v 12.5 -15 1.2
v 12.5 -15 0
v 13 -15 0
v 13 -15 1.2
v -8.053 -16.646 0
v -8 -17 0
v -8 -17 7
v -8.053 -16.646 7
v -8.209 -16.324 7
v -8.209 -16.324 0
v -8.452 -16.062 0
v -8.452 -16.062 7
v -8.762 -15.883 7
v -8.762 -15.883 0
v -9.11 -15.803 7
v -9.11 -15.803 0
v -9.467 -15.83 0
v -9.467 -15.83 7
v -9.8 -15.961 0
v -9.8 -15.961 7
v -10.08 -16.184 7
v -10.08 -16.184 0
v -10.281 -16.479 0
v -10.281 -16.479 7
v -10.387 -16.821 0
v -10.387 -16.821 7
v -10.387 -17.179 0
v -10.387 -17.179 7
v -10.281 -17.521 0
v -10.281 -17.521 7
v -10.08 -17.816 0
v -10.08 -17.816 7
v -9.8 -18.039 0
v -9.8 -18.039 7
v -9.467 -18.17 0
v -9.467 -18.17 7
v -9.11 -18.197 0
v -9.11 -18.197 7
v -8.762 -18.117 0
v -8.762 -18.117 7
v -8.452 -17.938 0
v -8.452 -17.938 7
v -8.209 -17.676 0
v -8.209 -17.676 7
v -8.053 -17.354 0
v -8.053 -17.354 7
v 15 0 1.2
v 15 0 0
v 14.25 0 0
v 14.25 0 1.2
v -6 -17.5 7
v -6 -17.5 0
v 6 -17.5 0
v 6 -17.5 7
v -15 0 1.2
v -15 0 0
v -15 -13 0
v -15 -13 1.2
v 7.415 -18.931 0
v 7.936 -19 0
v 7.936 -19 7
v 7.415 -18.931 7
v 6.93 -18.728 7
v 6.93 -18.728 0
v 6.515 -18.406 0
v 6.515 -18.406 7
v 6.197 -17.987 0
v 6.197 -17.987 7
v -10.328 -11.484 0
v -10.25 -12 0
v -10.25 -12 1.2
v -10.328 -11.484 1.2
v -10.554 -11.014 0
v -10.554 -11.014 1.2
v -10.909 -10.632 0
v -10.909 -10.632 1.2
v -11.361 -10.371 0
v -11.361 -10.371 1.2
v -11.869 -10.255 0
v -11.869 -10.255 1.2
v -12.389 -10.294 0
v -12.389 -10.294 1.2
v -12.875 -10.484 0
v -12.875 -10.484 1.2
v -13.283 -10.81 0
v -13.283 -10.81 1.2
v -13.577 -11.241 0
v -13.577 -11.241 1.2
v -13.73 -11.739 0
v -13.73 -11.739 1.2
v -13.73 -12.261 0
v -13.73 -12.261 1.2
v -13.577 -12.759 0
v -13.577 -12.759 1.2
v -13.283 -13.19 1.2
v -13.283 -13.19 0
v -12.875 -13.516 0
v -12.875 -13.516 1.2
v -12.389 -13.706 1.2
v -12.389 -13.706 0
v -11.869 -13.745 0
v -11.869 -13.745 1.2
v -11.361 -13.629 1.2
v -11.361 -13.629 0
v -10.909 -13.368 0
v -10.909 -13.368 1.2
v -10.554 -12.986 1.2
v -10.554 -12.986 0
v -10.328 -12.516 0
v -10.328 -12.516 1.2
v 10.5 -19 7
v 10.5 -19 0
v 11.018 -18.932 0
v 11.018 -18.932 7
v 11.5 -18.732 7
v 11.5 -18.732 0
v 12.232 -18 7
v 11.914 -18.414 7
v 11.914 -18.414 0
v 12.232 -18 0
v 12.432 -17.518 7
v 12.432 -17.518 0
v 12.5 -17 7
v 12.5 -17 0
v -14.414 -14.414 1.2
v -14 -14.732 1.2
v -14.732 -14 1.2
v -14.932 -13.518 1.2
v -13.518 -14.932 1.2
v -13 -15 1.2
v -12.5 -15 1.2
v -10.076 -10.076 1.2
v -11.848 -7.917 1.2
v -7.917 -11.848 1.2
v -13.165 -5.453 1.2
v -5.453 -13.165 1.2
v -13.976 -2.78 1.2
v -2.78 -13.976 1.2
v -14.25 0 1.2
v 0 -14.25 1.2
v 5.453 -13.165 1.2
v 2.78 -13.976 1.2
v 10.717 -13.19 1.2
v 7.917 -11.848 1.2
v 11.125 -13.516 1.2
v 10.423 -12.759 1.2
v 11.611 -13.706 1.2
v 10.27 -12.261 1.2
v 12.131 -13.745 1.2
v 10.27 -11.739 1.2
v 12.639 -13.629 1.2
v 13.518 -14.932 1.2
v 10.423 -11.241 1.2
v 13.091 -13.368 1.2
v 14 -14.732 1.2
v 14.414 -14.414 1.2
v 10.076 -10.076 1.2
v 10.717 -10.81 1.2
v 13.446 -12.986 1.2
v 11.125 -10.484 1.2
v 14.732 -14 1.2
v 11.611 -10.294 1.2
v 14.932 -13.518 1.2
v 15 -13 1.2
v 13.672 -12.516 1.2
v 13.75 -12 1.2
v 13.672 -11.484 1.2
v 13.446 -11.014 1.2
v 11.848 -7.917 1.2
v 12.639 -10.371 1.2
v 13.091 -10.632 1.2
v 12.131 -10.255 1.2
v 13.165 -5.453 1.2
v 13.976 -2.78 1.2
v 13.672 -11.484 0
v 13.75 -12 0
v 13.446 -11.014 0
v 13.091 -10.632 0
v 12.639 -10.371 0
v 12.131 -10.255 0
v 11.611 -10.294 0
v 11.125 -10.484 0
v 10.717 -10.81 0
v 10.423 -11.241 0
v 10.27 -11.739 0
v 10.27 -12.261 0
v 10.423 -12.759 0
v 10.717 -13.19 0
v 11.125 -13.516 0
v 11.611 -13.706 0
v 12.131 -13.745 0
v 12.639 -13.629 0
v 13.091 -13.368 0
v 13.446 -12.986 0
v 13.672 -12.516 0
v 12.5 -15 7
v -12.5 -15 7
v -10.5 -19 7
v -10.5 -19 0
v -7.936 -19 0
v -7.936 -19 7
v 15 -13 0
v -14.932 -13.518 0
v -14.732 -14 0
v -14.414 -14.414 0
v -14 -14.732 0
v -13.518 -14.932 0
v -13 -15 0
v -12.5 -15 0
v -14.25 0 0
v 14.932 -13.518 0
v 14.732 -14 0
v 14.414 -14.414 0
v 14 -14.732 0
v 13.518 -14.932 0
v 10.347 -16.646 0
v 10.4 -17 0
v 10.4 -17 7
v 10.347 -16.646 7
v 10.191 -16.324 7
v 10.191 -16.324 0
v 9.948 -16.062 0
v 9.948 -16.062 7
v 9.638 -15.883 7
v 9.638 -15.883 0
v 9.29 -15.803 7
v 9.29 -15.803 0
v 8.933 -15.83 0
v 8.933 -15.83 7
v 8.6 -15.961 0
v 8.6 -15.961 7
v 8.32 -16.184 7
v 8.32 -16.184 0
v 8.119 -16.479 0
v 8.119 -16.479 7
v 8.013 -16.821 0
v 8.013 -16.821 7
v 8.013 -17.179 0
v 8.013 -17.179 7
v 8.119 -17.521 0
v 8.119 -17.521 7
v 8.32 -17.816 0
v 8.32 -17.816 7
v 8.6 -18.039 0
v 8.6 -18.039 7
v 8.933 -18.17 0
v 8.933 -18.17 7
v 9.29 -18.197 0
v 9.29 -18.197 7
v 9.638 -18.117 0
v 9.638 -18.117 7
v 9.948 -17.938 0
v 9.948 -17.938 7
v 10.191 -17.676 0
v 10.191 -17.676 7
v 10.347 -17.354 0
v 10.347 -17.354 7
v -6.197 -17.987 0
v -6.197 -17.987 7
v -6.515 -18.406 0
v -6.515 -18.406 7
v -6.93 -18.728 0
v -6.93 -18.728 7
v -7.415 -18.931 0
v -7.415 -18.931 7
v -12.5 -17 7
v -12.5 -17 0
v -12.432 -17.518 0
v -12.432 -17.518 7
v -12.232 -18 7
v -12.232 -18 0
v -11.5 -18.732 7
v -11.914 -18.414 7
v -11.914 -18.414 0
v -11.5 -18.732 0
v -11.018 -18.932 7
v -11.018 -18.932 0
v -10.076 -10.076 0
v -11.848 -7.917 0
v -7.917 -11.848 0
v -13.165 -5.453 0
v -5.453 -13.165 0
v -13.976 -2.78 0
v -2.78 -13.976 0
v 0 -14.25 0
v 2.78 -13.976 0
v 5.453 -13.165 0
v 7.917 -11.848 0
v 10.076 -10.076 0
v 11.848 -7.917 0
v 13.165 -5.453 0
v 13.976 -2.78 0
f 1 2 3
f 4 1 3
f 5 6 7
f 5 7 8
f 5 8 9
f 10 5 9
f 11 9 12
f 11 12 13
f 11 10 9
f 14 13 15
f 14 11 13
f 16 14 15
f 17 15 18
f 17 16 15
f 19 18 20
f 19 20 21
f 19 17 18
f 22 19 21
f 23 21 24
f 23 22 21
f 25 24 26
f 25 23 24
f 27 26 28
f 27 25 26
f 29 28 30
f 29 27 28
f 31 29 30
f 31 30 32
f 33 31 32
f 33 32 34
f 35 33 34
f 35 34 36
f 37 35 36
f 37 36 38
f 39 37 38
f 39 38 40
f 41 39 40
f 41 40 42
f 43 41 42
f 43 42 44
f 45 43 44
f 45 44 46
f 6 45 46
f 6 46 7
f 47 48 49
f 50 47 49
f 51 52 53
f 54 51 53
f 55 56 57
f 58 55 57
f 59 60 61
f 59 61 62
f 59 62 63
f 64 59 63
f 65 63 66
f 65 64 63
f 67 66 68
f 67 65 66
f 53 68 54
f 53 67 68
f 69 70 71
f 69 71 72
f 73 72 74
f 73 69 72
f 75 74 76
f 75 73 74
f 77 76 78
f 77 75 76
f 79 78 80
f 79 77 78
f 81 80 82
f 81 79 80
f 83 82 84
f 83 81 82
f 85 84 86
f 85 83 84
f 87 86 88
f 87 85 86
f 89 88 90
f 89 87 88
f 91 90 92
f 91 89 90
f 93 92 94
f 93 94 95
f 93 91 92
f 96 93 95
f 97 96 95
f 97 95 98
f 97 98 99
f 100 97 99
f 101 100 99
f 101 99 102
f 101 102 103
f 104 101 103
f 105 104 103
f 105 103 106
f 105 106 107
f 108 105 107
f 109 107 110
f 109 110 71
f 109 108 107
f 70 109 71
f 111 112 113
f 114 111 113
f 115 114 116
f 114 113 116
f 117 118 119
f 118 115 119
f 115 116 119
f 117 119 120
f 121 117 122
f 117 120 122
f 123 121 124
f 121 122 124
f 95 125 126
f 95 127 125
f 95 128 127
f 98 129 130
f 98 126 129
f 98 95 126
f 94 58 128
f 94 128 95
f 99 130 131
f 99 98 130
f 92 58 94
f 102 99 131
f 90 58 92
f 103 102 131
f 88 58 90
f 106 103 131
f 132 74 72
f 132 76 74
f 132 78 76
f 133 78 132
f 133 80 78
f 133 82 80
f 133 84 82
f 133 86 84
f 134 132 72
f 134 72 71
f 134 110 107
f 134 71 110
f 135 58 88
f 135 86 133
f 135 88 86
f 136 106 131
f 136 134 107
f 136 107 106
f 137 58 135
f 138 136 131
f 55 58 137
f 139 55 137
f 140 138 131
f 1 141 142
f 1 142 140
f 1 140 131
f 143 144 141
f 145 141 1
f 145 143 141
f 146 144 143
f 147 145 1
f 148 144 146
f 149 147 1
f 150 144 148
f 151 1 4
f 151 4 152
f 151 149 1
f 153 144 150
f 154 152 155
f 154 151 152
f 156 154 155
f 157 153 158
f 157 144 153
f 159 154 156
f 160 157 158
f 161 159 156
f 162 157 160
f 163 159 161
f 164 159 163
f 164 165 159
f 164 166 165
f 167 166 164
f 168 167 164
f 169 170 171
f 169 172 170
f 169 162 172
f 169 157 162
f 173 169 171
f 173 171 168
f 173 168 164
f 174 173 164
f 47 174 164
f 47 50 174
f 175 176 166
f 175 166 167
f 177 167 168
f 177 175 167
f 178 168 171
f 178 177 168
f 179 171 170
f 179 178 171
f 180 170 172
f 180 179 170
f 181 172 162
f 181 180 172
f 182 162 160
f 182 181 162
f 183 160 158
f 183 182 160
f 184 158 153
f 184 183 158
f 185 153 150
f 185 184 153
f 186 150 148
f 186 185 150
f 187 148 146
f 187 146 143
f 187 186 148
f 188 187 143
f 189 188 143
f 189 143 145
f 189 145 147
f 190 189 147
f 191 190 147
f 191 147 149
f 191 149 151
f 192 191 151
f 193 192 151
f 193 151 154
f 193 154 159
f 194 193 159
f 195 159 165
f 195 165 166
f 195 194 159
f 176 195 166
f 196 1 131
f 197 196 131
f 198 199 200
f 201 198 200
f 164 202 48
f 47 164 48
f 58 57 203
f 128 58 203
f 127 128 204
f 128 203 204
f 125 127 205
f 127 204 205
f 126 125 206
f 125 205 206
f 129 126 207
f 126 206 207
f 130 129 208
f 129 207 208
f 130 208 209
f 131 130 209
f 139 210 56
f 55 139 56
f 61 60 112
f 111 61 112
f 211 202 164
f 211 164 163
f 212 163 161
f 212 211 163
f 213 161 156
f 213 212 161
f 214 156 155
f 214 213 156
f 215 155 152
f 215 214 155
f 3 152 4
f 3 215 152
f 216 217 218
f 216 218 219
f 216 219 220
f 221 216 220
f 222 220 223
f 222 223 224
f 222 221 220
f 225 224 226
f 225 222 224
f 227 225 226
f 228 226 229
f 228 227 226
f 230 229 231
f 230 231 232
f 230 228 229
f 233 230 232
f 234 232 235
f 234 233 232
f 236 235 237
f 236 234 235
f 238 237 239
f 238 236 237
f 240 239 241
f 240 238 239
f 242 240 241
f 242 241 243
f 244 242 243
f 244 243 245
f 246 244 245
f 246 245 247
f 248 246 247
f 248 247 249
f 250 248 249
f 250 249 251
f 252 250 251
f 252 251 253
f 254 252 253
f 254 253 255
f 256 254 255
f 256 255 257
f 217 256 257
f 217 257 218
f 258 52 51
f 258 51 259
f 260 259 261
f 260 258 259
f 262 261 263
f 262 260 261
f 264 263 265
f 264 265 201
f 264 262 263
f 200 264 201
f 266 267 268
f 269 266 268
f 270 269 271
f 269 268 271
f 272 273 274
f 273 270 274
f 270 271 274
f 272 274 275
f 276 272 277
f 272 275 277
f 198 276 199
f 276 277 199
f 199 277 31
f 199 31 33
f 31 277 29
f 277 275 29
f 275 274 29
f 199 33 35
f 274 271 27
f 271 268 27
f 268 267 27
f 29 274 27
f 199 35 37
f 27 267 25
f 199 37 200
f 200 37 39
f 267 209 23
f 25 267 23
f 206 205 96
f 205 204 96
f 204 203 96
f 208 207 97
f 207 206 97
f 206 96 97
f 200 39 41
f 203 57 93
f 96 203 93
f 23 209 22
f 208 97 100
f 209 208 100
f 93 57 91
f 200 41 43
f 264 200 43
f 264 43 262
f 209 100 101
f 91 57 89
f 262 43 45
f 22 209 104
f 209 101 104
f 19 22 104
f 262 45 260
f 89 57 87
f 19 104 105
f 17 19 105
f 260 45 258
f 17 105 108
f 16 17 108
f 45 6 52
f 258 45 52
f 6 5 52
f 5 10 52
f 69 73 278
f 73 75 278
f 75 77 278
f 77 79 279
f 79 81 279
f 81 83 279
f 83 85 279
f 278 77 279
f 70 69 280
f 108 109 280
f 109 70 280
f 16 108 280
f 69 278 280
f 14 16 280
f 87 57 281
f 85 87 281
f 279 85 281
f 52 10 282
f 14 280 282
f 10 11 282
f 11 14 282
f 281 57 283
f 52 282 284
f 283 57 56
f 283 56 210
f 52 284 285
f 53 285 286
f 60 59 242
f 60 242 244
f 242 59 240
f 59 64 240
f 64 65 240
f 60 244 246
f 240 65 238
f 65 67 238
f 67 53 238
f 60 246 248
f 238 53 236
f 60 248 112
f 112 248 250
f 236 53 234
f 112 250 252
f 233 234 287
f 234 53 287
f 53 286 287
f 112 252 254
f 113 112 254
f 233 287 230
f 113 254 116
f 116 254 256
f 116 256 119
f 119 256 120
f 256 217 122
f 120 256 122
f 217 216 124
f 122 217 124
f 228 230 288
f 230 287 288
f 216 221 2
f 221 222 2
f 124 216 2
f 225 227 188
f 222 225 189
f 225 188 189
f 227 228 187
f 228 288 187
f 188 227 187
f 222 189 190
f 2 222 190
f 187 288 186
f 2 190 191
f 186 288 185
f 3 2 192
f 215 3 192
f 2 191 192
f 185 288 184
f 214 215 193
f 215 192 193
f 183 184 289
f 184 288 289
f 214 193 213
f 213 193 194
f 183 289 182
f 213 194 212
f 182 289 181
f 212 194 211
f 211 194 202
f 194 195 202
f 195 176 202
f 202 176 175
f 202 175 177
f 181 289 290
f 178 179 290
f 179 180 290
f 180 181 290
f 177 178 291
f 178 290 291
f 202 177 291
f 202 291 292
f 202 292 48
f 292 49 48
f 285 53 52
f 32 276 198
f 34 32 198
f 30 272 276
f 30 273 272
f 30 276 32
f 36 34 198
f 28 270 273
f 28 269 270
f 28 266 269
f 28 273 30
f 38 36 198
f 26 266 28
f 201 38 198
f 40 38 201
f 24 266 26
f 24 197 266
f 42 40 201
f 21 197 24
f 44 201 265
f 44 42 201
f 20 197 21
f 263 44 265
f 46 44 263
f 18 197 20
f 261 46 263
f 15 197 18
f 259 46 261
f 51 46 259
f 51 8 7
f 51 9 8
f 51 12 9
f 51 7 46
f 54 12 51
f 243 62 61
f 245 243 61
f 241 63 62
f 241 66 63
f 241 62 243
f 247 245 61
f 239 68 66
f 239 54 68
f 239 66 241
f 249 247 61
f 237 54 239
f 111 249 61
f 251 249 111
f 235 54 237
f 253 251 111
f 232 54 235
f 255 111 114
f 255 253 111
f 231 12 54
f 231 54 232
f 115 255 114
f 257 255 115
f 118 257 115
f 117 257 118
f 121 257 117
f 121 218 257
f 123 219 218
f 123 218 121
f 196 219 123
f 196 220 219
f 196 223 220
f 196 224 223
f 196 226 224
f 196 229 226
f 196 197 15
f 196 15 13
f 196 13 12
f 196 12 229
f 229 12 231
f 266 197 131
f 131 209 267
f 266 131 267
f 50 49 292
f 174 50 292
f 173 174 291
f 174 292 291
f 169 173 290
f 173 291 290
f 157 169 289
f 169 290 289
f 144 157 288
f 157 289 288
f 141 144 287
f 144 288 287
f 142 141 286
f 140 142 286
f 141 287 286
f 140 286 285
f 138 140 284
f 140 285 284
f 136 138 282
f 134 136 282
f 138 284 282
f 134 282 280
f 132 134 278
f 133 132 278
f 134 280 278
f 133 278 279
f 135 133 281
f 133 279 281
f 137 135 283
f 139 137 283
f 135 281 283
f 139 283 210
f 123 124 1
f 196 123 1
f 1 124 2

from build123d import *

# Parameters (mm, degrees)
F0_R        = 1.2
F0_W        = 12
F0_H        = 2.5
F0_R_2      = 1.75
F1_DEPTH    = 1.2
F2_DEPTH    = 7
F3_T1_DEPTH = 17
F3_T3_DEPTH = 16.6824583655
F3_T5_DEPTH = 11.2


# Not quite as in the source:
# - a fillet or chamfer that OpenCascade refuses, or shapes differently, is made with other operations: its cross-section is extruded or revolved along the edge and cut away or added
# - a feature names something its author has since deleted; it is built from what else it names


with BuildPart() as f1:
    # F0 (on Top) → F1 (new body)
    with BuildSketch(Plane.XY):
        Polygon((-6, -17.5), (-6, -15), (-12.5, -15), (-12.5, -19), (-6, -19), align=None)
        with Locations((-9.2, -17)):
            Circle(F0_R, mode=Mode.SUBTRACT)
        with Locations((0, -16.25)):
            Rectangle(F0_W, F0_H)
        Polygon((12.5, -19), (12.5, -15), (6, -15), (6, -17.5), (6, -19), align=None)
        with Locations((9.2, -17)):
            Circle(F0_R, mode=Mode.SUBTRACT)
        with BuildLine():
            Line((12.5, -15), (15, -15))
            Line((15, -15), (15, 0))
            Line((15, 0), (14.25, 0))
            ThreePointArc((14.25, 0), (0, -14.25), (-14.25, 0))
            Line((-14.25, 0), (-15, 0))
            Line((-15, 0), (-15, -15))
            Line((-15, -15), (-12.5, -15))
            Line((-12.5, -15), (-6, -15))
            Line((-6, -15), (6, -15))
            Line((6, -15), (12.5, -15))
        make_face()
        with Locations((-12, -12)):
            Circle(F0_R_2, mode=Mode.SUBTRACT)
        with Locations((12, -12)):
            Circle(F0_R_2, mode=Mode.SUBTRACT)
    extrude(amount=F1_DEPTH)

    # F0 (on Top) → F2 (join)
    with BuildSketch(Plane.XY):
        with Locations((0, -16.25)):
            Rectangle(F0_W, F0_H)
        Polygon((-6, -17.5), (-6, -15), (-12.5, -15), (-12.5, -19), (-6, -19), align=None)
        with Locations((-9.2, -17)):
            Circle(F0_R, mode=Mode.SUBTRACT)
        Polygon((12.5, -19), (12.5, -15), (6, -15), (6, -17.5), (6, -19), align=None)
        with Locations((9.2, -17)):
            Circle(F0_R, mode=Mode.SUBTRACT)
    extrude(amount=F2_DEPTH)

    # F3: fillet of radius 2 on 6 edges, made by hand

    # F3_s2 → F3_t1 (cut)
    with BuildSketch(Plane.XY.offset(-5)):
        with BuildLine():
            ThreePointArc((-12.5, -17), (-11.9142135624, -18.4142135624), (-10.5, -19))
            Line((-10.5, -19), (-12.5, -19))
            Line((-12.5, -19), (-12.5, -17))
        make_face()
        with BuildLine():
            ThreePointArc((10.5, -19), (11.9142135624, -18.4142135624), (12.5, -17))
            Line((12.5, -17), (12.5, -19))
            Line((12.5, -19), (10.5, -19))
        make_face()
    extrude(amount=F3_T1_DEPTH, mode=Mode.SUBTRACT)

    # F3_s4 → F3_t3 (cut)
    with BuildSketch(Plane.XY.offset(-4.8412291828)):
        with BuildLine():
            ThreePointArc((-6, -17.5), (-6.7117468017, -18.5811388301), (-7.9364916731, -19))
            Line((-7.9364916731, -19), (-6, -19))
            Line((-6, -19), (-6, -17.5))
        make_face()
        with BuildLine():
            ThreePointArc((7.9364916731, -19), (6.7117468017, -18.5811388301), (6, -17.5))
            Line((6, -17.5), (6, -19))
            Line((6, -19), (7.9364916731, -19))
        make_face()
    extrude(amount=F3_T3_DEPTH, mode=Mode.SUBTRACT)

    # F3_s6 → F3_t5 (cut)
    with BuildSketch(Plane.XY.offset(-5)):
        with BuildLine():
            ThreePointArc((15, -13), (14.4142135624, -14.4142135624), (13, -15))
            Line((13, -15), (15, -15))
            Line((15, -15), (15, -13))
        make_face()
        with BuildLine():
            ThreePointArc((-15, -13), (-14.4142135624, -14.4142135624), (-13, -15))
            Line((-13, -15), (-15, -15))
            Line((-15, -15), (-15, -13))
        make_face()
    extrude(amount=F3_T5_DEPTH, mode=Mode.SUBTRACT)


solid = f1.part
